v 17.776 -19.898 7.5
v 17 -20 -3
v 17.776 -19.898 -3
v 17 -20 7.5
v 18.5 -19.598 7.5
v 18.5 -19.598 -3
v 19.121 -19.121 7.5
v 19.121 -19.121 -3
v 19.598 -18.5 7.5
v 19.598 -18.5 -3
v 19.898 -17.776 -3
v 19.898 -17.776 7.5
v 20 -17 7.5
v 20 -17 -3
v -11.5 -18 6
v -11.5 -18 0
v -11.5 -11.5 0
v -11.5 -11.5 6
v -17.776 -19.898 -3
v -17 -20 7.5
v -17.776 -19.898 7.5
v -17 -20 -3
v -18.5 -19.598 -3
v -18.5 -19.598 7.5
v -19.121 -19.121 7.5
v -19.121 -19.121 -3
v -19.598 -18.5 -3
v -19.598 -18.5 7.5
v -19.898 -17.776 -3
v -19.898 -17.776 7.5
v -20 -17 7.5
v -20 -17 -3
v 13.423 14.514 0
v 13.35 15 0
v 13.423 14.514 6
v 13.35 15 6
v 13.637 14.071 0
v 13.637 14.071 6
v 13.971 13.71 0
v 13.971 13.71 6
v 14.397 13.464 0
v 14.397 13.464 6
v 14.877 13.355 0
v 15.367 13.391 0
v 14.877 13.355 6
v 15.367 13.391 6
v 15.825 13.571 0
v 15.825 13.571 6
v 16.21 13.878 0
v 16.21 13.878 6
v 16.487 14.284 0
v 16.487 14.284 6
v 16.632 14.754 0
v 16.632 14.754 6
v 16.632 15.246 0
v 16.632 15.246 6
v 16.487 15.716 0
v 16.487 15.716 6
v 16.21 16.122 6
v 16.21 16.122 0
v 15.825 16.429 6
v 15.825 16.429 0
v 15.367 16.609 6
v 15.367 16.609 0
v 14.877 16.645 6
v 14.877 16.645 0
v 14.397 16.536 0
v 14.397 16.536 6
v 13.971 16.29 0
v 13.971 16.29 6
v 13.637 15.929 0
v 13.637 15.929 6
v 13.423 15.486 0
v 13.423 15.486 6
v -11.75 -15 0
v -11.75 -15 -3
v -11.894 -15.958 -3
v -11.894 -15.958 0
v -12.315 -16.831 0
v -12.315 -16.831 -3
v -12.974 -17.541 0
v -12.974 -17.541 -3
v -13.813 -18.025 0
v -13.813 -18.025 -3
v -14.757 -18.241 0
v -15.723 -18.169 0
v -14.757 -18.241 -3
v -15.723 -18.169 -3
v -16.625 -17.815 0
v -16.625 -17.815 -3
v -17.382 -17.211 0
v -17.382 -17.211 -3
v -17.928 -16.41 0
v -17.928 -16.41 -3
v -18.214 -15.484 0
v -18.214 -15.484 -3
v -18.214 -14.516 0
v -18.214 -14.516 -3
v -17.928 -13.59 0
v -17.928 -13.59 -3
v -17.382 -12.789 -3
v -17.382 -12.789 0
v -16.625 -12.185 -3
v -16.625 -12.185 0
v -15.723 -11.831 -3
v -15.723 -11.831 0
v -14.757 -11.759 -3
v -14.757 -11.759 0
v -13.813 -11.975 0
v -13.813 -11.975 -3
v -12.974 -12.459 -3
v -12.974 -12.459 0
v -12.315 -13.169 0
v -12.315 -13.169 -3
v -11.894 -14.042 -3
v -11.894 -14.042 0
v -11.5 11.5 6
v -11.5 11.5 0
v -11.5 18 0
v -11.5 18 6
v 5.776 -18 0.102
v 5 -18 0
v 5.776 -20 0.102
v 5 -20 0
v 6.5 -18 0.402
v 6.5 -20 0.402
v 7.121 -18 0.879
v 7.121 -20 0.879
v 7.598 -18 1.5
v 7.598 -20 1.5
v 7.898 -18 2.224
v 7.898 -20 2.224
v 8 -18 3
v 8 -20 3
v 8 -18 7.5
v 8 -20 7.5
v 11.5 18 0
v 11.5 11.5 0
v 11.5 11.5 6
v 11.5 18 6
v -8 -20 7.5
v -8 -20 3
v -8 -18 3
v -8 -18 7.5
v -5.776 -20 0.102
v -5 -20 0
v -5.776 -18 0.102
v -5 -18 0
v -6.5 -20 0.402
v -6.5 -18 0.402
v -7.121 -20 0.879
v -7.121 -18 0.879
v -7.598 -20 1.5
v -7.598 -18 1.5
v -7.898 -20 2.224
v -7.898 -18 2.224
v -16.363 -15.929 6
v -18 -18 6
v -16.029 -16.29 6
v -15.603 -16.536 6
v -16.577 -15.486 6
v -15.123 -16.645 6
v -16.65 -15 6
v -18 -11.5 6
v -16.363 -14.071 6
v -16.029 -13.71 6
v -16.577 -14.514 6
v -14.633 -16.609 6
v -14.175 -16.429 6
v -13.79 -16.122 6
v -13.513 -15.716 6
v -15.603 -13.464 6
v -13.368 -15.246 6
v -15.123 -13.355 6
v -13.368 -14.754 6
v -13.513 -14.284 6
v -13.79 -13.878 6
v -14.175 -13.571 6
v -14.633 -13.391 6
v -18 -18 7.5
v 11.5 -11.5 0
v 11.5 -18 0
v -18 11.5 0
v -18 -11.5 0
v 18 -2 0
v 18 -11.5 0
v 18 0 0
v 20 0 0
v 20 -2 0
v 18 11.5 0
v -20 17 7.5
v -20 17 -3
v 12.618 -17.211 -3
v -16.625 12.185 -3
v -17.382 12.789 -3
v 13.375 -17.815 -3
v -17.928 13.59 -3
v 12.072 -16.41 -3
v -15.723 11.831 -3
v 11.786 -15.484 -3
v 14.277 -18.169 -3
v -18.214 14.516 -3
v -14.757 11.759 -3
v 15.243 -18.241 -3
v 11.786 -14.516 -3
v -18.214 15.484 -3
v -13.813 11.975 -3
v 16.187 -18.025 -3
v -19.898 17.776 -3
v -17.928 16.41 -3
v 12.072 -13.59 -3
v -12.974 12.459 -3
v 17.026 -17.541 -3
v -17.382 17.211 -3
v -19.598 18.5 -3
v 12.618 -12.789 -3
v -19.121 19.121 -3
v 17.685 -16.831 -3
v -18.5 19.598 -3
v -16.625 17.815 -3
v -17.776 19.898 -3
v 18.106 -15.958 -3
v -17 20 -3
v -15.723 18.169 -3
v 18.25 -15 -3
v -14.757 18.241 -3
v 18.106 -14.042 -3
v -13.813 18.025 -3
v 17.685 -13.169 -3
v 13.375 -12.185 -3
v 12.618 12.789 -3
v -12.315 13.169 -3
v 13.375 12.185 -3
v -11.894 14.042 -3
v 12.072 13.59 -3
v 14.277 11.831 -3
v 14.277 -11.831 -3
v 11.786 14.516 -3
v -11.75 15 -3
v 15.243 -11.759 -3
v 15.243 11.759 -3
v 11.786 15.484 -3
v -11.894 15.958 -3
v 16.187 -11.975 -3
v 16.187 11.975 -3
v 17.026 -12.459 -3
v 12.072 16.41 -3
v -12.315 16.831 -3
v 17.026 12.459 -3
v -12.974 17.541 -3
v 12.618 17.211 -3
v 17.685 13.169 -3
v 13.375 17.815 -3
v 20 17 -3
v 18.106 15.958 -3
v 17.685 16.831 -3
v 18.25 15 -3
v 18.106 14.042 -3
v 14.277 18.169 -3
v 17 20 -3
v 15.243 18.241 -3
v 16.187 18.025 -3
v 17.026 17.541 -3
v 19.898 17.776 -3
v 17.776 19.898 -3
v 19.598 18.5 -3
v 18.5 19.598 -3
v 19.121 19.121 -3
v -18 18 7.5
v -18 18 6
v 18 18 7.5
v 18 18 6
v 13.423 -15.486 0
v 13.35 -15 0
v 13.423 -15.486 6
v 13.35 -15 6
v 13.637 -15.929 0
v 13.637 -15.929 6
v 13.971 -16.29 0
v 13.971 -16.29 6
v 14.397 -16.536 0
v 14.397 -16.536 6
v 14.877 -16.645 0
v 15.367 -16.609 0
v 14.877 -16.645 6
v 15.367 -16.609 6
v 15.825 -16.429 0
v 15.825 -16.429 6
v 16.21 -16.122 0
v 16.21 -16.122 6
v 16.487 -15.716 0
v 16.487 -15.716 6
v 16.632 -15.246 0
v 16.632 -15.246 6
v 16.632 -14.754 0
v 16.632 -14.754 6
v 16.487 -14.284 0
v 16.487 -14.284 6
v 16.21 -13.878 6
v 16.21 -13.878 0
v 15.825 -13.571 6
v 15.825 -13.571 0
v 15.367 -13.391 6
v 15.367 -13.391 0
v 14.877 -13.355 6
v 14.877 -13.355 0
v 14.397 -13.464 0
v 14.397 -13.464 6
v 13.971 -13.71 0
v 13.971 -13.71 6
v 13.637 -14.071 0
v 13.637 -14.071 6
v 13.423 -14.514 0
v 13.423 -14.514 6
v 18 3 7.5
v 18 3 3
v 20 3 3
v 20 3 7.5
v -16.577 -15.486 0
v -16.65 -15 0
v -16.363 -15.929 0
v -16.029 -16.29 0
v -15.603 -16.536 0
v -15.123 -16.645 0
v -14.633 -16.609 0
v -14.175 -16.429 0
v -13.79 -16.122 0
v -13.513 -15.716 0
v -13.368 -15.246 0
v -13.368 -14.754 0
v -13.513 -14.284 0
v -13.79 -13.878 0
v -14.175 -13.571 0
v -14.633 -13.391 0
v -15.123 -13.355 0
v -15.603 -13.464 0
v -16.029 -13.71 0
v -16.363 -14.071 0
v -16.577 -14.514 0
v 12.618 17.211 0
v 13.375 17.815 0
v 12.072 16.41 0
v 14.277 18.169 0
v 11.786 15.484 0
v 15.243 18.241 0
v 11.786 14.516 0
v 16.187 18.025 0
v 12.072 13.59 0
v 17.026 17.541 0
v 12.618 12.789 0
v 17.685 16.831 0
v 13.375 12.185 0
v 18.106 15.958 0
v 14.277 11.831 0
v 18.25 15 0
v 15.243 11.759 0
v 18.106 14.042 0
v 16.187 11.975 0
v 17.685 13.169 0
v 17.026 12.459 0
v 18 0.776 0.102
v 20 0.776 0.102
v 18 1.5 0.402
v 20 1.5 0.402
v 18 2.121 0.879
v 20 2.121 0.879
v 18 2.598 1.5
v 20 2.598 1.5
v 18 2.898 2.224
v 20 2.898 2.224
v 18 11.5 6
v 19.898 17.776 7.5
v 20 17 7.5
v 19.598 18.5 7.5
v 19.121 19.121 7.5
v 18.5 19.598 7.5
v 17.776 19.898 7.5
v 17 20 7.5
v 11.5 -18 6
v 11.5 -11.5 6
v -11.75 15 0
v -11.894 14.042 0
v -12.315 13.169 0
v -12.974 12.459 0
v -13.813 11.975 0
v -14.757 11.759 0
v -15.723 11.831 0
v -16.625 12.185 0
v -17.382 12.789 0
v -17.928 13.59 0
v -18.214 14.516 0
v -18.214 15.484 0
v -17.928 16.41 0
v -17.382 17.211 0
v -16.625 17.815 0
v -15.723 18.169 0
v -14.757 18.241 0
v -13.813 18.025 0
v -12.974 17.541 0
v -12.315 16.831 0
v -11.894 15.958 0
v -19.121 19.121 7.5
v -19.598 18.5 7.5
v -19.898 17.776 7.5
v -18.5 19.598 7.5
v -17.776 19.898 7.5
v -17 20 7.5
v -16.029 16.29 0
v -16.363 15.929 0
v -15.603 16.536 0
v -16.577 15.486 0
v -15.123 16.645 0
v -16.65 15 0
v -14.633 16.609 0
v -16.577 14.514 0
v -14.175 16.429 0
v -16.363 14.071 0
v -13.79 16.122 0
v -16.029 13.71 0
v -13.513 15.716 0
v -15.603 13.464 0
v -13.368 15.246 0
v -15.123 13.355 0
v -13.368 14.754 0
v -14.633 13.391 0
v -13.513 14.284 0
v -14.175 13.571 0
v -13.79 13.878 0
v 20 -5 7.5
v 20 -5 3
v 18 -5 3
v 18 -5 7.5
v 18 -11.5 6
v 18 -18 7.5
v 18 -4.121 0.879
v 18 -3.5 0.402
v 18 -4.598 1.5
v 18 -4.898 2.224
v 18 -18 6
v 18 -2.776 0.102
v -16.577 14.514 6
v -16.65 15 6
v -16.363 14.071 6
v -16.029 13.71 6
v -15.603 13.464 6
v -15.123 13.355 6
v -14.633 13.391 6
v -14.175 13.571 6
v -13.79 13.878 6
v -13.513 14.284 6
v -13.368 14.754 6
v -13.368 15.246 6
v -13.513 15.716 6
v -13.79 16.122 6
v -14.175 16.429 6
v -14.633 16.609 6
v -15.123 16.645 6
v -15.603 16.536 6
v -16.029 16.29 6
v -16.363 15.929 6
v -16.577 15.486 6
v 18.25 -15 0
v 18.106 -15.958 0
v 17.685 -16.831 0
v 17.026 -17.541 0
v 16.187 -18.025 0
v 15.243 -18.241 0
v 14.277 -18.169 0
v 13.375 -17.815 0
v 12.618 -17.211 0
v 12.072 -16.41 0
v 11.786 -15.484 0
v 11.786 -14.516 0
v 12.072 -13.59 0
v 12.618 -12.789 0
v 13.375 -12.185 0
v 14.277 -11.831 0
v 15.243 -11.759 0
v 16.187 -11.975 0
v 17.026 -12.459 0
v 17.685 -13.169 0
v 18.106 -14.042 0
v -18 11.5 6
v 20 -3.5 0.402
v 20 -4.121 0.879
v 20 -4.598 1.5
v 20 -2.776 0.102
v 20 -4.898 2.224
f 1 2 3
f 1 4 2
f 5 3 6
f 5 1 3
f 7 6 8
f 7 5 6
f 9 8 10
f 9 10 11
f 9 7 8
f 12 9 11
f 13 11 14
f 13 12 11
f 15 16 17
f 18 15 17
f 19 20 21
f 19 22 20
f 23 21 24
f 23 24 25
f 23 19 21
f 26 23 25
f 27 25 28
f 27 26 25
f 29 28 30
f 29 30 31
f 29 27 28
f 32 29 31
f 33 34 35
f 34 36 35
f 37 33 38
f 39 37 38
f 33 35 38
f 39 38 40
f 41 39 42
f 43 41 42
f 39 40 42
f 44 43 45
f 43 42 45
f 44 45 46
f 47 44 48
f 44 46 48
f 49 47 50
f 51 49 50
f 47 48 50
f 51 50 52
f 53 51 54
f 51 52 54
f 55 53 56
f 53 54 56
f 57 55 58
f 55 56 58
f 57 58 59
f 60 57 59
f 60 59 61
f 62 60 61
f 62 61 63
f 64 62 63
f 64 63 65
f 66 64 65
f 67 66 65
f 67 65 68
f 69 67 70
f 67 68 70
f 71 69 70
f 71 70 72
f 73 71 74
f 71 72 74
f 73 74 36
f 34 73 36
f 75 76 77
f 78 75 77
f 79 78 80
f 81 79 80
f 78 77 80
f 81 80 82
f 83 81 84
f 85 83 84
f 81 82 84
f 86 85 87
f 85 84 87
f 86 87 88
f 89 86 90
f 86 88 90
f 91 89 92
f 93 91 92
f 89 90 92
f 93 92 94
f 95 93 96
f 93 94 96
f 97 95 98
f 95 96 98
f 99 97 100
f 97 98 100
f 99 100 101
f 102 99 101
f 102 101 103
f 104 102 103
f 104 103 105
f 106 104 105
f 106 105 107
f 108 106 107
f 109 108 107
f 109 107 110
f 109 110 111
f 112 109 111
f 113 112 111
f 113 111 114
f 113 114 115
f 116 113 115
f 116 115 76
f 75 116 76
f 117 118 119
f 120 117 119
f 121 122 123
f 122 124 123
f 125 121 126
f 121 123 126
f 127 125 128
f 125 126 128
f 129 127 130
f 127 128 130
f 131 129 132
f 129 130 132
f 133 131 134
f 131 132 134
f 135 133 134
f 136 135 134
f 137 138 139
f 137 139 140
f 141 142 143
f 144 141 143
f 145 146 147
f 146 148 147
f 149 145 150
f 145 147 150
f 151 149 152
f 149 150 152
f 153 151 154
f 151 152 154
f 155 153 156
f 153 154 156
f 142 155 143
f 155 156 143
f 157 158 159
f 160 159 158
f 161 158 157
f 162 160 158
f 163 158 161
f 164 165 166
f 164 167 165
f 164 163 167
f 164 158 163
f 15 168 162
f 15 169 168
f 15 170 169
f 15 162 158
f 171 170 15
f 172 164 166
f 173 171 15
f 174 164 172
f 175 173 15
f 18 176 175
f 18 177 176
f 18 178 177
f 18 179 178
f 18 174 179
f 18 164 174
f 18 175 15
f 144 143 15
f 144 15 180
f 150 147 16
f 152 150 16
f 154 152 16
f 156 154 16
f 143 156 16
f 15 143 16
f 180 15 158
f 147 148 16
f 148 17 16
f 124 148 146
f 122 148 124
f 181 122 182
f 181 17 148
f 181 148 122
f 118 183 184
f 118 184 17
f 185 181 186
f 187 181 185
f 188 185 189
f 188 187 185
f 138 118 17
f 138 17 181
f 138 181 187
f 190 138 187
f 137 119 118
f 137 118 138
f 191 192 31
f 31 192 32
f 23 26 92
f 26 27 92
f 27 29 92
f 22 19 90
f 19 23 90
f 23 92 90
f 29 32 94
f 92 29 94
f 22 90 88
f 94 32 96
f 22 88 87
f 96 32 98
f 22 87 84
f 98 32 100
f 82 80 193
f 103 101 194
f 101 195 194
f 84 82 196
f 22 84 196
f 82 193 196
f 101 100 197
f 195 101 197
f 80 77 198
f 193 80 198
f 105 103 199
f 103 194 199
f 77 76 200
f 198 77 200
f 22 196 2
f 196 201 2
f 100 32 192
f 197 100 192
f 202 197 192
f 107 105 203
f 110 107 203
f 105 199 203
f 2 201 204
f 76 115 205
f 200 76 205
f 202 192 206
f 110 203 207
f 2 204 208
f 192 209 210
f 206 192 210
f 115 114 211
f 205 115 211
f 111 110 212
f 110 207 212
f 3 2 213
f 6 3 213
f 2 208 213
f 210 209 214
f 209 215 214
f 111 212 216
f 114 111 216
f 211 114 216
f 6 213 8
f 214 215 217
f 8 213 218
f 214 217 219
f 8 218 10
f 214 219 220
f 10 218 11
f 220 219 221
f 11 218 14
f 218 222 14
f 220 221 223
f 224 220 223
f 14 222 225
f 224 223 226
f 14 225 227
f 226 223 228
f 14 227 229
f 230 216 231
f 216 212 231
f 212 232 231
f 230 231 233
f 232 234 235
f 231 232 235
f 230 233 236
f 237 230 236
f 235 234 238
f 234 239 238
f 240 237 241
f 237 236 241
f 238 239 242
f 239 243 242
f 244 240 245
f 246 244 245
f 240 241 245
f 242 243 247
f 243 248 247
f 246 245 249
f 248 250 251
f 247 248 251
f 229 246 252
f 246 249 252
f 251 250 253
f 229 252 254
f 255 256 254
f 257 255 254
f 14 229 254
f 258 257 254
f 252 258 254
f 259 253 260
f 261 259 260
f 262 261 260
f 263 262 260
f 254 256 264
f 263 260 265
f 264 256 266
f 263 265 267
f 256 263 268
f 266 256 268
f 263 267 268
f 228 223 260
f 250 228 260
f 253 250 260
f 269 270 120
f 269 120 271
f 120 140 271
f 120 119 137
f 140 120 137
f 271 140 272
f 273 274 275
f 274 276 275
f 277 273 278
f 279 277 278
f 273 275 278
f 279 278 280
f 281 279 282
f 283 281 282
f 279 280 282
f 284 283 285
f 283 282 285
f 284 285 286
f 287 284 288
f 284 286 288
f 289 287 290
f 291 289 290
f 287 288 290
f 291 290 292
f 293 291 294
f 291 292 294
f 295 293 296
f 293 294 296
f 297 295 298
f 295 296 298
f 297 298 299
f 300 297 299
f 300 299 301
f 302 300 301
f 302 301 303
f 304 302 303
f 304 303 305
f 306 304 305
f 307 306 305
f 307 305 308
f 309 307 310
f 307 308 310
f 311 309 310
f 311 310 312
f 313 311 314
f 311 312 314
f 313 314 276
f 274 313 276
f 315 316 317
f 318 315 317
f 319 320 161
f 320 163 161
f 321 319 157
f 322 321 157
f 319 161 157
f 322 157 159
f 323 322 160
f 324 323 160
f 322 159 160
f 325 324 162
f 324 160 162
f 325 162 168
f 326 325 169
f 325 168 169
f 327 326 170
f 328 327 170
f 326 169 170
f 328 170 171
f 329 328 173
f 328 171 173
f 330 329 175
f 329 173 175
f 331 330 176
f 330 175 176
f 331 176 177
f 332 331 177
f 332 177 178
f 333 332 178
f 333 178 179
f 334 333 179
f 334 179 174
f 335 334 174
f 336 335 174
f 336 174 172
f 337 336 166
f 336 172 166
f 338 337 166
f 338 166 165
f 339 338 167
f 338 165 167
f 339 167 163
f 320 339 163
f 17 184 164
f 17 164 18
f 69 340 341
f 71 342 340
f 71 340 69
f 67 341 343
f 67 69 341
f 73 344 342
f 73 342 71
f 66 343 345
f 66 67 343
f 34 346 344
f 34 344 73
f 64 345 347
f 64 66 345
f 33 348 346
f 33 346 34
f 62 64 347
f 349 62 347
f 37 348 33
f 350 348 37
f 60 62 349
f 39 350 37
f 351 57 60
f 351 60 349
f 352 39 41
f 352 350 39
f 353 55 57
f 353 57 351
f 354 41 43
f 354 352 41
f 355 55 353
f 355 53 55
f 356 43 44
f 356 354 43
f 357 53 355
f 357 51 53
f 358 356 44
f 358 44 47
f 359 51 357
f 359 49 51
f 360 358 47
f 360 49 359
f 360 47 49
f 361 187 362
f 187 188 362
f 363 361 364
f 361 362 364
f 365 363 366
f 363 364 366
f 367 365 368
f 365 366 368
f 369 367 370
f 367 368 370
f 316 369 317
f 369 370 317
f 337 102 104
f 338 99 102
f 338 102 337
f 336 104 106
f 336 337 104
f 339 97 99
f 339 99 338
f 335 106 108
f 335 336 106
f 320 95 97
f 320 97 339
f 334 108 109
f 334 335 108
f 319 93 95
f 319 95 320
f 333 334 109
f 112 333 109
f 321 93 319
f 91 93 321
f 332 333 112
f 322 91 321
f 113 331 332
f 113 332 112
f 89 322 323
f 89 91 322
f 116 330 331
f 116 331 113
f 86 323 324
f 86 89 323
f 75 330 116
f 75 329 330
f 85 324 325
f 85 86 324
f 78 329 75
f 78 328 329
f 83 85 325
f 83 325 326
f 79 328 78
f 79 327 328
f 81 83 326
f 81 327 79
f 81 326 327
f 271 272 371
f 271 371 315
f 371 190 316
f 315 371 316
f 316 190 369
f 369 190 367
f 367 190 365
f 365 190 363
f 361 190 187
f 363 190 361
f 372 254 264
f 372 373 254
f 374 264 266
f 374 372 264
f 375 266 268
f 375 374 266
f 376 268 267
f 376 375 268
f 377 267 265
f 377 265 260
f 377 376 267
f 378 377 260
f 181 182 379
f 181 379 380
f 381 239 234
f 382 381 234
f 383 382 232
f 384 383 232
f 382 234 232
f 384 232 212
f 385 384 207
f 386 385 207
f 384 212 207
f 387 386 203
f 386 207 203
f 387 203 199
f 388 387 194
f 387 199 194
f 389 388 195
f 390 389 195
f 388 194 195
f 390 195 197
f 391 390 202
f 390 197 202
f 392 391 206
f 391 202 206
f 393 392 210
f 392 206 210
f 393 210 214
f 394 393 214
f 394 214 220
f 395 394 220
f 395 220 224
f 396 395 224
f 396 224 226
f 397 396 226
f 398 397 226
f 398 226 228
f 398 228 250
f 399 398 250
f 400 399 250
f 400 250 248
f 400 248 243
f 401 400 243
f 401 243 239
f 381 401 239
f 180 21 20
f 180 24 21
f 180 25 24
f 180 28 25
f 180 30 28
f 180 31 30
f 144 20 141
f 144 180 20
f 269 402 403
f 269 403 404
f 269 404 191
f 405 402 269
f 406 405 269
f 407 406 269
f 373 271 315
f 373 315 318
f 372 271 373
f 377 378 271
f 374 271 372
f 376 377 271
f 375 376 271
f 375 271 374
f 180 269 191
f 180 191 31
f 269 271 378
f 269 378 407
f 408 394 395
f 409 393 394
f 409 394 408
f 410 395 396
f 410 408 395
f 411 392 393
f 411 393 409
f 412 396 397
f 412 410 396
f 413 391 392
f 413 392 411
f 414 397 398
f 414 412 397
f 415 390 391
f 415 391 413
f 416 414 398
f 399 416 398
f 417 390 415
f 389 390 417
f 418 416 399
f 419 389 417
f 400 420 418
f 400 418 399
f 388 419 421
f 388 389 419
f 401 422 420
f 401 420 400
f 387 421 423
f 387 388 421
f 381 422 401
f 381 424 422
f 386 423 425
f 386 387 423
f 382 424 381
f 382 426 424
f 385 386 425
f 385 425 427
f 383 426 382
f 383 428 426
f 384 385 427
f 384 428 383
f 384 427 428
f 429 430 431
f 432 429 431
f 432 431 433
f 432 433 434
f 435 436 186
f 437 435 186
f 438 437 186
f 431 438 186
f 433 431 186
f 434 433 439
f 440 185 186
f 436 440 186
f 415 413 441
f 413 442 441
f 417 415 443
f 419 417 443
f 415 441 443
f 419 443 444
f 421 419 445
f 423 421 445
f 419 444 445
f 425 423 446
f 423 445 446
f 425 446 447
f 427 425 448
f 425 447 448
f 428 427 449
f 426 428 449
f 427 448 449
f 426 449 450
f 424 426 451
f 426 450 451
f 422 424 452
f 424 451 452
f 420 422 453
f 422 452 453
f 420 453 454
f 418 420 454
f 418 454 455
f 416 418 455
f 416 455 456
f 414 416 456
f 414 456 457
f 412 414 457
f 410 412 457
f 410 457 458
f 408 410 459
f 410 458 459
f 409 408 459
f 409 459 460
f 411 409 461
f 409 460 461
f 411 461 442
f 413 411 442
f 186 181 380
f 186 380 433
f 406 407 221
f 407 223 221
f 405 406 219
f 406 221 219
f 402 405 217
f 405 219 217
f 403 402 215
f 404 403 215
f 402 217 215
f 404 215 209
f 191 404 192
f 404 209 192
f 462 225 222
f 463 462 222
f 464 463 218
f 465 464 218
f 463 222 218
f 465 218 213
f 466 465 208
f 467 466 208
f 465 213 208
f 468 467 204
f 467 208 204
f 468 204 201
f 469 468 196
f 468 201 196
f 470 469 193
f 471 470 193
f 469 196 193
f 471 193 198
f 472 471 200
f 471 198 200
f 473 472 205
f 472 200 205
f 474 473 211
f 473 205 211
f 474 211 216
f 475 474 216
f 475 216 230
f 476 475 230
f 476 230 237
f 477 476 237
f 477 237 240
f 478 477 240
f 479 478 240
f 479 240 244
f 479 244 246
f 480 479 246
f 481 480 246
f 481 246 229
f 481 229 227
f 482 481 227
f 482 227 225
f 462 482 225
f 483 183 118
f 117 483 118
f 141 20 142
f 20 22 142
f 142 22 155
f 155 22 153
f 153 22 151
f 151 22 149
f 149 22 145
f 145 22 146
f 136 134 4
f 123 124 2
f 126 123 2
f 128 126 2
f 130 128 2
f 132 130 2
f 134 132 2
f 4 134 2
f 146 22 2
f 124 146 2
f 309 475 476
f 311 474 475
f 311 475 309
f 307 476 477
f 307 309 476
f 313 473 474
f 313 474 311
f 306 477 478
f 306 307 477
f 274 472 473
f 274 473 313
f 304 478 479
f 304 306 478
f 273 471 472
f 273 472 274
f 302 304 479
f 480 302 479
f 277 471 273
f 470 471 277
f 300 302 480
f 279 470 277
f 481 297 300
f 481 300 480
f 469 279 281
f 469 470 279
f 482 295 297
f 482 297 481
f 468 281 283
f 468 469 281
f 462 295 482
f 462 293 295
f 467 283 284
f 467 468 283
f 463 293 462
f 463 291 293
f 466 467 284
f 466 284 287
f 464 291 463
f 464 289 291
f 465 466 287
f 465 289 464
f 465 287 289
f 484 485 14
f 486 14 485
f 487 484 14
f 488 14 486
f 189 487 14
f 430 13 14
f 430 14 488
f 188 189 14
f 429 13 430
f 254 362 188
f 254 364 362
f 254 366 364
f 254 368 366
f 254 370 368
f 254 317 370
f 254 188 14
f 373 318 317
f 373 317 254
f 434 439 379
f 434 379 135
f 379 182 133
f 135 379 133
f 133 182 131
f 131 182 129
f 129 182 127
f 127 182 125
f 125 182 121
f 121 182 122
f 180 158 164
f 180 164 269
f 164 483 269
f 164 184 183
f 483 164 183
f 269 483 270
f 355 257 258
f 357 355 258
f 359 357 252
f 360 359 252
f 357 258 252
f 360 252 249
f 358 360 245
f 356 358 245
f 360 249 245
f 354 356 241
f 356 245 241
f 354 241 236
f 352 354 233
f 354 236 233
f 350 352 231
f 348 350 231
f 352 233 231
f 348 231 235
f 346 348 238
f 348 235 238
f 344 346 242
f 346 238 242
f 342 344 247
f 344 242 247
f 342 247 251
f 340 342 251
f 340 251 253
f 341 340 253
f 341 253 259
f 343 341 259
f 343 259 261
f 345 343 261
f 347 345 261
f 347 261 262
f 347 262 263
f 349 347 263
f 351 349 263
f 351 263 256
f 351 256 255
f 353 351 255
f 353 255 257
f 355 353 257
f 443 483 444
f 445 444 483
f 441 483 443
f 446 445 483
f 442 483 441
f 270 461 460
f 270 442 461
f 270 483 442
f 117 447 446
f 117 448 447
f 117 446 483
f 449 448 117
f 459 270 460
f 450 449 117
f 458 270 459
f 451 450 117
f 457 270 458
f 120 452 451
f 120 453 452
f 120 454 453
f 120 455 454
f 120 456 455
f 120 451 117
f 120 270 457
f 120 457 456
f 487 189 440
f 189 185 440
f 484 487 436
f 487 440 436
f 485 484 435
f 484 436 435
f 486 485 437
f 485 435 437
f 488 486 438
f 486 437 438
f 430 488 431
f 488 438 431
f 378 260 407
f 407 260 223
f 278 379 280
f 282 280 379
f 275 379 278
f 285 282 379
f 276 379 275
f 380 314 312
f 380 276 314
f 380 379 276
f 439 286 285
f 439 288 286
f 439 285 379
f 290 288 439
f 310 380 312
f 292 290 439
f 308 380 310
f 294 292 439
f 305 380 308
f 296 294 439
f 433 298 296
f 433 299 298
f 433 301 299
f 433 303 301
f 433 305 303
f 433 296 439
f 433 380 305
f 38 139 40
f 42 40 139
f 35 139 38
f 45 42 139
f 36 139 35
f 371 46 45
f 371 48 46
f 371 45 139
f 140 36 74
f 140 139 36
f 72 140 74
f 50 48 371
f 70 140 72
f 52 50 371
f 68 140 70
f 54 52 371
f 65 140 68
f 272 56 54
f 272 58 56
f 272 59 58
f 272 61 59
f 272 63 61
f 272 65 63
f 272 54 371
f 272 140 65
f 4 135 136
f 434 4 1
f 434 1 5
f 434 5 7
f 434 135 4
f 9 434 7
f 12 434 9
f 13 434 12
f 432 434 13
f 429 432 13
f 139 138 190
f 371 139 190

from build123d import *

# Parameters (mm, degrees)
F0_W           = 16
F0_H           = 2
F0_W_2         = 6.5
F0_H_2         = 6.5
F0_W_3         = 2
F0_H_3         = 8
F1_DEPTH       = 3
F2_DEPTH       = 7.5
F3_DEPTH       = 6
F5_D           = 3.3
F5_CBORE_D     = 6.5
F5_CBORE_DEPTH = 3
F6_R           = 3


with BuildPart() as f1:
    # F0 (on Top) → F1 (new body)
    with BuildSketch(Plane.XY):
        Polygon((-8, -20), (-8, -18), (-11.5, -18), (-18, -18), (-18, -11.5), (-18, 11.5), (-18, 18), (-11.5, 18), (11.5, 18), (18, 18), (18, 11.5), (18, 3), (20, 3), (20, 20), (-20, 20), (-20, -20), align=None)
        with Locations((0, -19)):
            Rectangle(F0_W, F0_H)
        with Locations((-14.75, -14.75)):
            Rectangle(F0_W_2, F0_H_2)
        Polygon((-8, -18), (8, -18), (11.5, -18), (11.5, -11.5), (18, -11.5), (18, -5), (18, 3), (18, 11.5), (11.5, 11.5), (11.5, 18), (-11.5, 18), (-11.5, 11.5), (-18, 11.5), (-18, -11.5), (-11.5, -11.5), (-11.5, -18), align=None)
        with Locations((14.75, -14.75)):
            Rectangle(F0_W_2, F0_H_2)
        Polygon((11.5, -18), (8, -18), (8, -20), (20, -20), (20, -5), (18, -5), (18, -11.5), (18, -18), align=None)
        with Locations((14.75, 14.75)):
            Rectangle(F0_W_2, F0_H_2)
        with Locations((-14.75, 14.75)):
            Rectangle(F0_W_2, F0_H_2)
        with Locations((19, -1)):
            Rectangle(F0_W_3, F0_H_3)
    extrude(amount=-F1_DEPTH)

    # F0 (on Top) → F2 (join)
    with BuildSketch(Plane.XY):
        Polygon((-8, -20), (-8, -18), (-11.5, -18), (-18, -18), (-18, -11.5), (-18, 11.5), (-18, 18), (-11.5, 18), (11.5, 18), (18, 18), (18, 11.5), (18, 3), (20, 3), (20, 20), (-20, 20), (-20, -20), align=None)
        Polygon((11.5, -18), (8, -18), (8, -20), (20, -20), (20, -5), (18, -5), (18, -11.5), (18, -18), align=None)
    extrude(amount=F2_DEPTH)

    # F0 (on Top) → F3 (join)
    with BuildSketch(Plane.XY):
        with Locations((-14.75, 14.75)):
            Rectangle(F0_W_2, F0_H_2)
        Polygon((-8, -20), (-8, -18), (-11.5, -18), (-18, -18), (-18, -11.5), (-18, 11.5), (-18, 18), (-11.5, 18), (11.5, 18), (18, 18), (18, 11.5), (18, 3), (20, 3), (20, 20), (-20, 20), (-20, -20), align=None)
        with Locations((14.75, 14.75)):
            Rectangle(F0_W_2, F0_H_2)
        with Locations((14.75, -14.75)):
            Rectangle(F0_W_2, F0_H_2)
        Polygon((11.5, -18), (8, -18), (8, -20), (20, -20), (20, -5), (18, -5), (18, -11.5), (18, -18), align=None)
        with Locations((-14.75, -14.75)):
            Rectangle(F0_W_2, F0_H_2)
    extrude(amount=F3_DEPTH)

    # F5 (through all)
    with Locations(Plane(origin=(0, 0, -3), x_dir=(1, 0, 0), z_dir=(0, 0, -1))):
        with Locations((-15, 15), (15, 15), (15, -15), (-15, -15)):
            CounterBoreHole(F5_D / 2, F5_CBORE_D / 2, F5_CBORE_DEPTH)

    # F6
    f6_edges = [f1.edges().sort_by_distance(p)[0] for p in [
        (-20, -20, 2.25),
        (20, -20, 2.25),
        (-20, 20, 2.25),
        (20, 20, 2.25),
        (-8, -19, 0),
        (8, -19, 0),
        (19, 3, 0),
        (19, -5, 0),
    ]]
    fillet(f6_edges, radius=F6_R)


solid = f1.part
